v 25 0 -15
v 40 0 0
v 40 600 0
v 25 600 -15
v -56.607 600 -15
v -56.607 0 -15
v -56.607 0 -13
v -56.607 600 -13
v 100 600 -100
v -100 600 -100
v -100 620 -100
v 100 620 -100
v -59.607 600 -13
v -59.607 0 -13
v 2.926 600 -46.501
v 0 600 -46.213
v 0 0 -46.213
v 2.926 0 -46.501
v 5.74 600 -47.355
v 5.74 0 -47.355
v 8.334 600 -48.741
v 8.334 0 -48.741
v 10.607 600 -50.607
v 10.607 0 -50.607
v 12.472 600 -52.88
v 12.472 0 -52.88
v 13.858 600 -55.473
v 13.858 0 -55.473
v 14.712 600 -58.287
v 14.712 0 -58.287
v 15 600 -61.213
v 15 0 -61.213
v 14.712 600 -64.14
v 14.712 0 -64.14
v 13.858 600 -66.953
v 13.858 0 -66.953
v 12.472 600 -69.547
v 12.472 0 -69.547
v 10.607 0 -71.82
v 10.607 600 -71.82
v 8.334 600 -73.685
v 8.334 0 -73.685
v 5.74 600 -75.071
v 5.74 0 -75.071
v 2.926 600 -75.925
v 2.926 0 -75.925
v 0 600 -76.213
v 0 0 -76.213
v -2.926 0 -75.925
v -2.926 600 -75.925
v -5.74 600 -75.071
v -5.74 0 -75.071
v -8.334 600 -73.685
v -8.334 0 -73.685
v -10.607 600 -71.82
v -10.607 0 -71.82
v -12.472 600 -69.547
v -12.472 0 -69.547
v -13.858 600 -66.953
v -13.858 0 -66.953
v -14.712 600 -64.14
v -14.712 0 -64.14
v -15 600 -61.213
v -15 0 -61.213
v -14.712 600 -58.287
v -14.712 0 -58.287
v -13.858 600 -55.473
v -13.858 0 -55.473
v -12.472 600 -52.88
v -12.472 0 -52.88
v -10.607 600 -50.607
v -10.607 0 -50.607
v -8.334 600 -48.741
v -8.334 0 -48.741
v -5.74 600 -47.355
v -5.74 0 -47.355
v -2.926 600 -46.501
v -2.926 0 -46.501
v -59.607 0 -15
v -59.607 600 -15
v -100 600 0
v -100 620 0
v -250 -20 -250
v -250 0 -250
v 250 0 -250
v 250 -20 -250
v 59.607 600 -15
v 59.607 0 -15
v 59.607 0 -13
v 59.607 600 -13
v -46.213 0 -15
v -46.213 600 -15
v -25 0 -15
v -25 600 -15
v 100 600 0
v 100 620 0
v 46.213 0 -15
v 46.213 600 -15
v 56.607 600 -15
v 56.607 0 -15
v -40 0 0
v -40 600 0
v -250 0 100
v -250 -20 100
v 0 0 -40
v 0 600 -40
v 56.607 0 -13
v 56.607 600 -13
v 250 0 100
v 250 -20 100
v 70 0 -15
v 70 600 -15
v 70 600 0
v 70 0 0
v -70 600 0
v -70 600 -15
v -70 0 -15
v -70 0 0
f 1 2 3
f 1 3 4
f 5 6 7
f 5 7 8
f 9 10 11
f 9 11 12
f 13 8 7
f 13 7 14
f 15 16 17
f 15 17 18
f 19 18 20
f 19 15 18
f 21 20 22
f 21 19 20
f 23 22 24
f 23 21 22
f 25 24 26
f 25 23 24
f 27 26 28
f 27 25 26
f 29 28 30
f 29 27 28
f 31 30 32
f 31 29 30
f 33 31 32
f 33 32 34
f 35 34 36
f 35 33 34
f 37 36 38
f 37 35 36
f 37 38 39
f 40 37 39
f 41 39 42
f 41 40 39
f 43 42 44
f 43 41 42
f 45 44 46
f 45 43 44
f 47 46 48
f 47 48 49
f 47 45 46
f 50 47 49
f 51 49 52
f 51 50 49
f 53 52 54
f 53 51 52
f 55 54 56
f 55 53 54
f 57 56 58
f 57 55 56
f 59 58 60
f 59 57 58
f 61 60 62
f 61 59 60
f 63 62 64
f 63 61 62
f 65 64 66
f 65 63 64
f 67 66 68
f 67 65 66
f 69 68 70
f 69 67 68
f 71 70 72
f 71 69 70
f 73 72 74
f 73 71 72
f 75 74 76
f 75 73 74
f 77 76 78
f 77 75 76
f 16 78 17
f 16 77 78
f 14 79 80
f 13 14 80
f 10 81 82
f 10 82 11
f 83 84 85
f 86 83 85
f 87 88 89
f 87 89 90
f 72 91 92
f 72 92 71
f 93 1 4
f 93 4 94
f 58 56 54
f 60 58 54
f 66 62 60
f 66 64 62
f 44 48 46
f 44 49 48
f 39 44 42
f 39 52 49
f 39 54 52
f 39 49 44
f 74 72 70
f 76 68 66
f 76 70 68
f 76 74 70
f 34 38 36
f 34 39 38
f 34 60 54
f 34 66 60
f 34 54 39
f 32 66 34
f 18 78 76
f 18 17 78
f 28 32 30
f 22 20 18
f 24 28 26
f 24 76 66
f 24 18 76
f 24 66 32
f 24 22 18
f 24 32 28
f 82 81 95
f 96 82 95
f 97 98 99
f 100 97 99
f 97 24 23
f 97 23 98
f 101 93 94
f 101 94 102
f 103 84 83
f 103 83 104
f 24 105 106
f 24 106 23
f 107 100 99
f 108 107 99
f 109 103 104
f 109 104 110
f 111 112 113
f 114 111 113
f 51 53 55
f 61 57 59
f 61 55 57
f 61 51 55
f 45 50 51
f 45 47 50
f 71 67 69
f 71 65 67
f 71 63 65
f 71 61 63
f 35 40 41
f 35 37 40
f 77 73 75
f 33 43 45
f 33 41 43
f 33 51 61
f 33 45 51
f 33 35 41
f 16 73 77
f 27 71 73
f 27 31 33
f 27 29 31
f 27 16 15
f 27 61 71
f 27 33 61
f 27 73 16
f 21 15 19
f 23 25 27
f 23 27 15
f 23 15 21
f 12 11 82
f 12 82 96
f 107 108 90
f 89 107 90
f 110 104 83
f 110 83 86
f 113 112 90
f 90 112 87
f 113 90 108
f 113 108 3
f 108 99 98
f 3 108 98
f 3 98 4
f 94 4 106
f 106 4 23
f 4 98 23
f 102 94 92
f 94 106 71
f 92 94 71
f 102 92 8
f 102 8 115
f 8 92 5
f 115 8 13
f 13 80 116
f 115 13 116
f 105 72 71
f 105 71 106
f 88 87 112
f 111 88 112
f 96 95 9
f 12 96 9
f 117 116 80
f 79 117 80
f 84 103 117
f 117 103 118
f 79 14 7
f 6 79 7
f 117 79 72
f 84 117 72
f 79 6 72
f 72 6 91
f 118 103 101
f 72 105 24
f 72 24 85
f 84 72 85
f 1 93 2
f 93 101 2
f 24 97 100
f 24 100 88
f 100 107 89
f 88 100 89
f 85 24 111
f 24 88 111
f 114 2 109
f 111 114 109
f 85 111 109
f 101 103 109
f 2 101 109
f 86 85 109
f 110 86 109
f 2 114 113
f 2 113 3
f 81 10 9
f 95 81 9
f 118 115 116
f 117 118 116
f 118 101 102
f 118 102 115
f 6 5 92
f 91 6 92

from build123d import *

# Parameters (mm, degrees)
SALIENTE_EXTRUIR1_DEPTH = 600
CROQUIS2_W              = 500
CROQUIS2_H              = 350
SALIENTE_EXTRUIR2_DEPTH = 20
CROQUIS3_W              = 3
CROQUIS3_H              = 600
CORTAR_EXTRUIR1_DEPTH   = 2
SALIENTE_EXTRUIR3_REACH = 715.723
CROQUIS4_R              = 15
CROQUIS6_W              = 200
CROQUIS6_H              = 100
SALIENTE_EXTRUIR5_DEPTH = 20


with BuildPart() as part:
    # Croquis1 → Saliente-Extruir1 (new body)
    with BuildSketch(Plane(origin=(0, 0, 0), x_dir=(1, 0, 0), z_dir=(0, 1, 0))):
        Polygon((25, 15), (-25, 15), (-40, 0), (-70, 0), (-70, 15), (-46.213203436, 15), (-10.606601718, 50.606601718), (0, 40), (10.606601718, 50.606601718), (46.213203436, 15), (70, 15), (70, 0), (40, 0), align=None)
    extrude(amount=SALIENTE_EXTRUIR1_DEPTH)

    # Croquis2 → Saliente-Extruir2 (add)
    with BuildSketch(Plane.XZ):
        with Locations((0, -75)):
            Rectangle(CROQUIS2_W, CROQUIS2_H)
    extrude(amount=SALIENTE_EXTRUIR2_DEPTH)

    # Croquis3 → Cortar-Extruir1 (cut)
    with BuildSketch(Plane(origin=(0, 0, -15), x_dir=(-1, 0, 0), z_dir=(0, 0, -1))):
        with Locations((58.106601718, 300)):
            Rectangle(CROQUIS3_W, CROQUIS3_H)
    cortar_extruir1 = extrude(amount=-CORTAR_EXTRUIR1_DEPTH, mode=Mode.SUBTRACT)

    # Simetría1: Cortar-Extruir1 across plane
    add(cortar_extruir1.mirror(Plane(origin=(0, 0, 0), x_dir=(0, 0, 1), z_dir=(1, 0, 0))), mode=Mode.SUBTRACT)


with BuildPart() as body_2:

    # Croquis4 → Saliente-Extruir3 (new, up to next)
    with BuildSketch(Plane(origin=(0, 600, 0), x_dir=(1, 0, 0), z_dir=(0, 1, 0)), mode=Mode.PRIVATE) as saliente_extruir3_sk1:
        with Locations(Location((0, 61.213203436, 0), (0, 0, 270))):
            Circle(CROQUIS4_R)
    saliente_extruir3_tool1 = extrude(saliente_extruir3_sk1.sketch, amount=-SALIENTE_EXTRUIR3_REACH, mode=Mode.PRIVATE) - part.part
    add(saliente_extruir3_tool1.solids().sort_by_distance((0, 600, -61.213203))[0])


with BuildPart() as body_3:
    # Croquis6 → Saliente-Extruir5 (new body)
    with BuildSketch(Plane(origin=(0, 600, 0), x_dir=(1, 0, 0), z_dir=(0, 1, 0))):
        with Locations((0, 50)):
            Rectangle(CROQUIS6_W, CROQUIS6_H)
    extrude(amount=SALIENTE_EXTRUIR5_DEPTH)


solid = Compound([part.part, body_2.part, body_3.part])
